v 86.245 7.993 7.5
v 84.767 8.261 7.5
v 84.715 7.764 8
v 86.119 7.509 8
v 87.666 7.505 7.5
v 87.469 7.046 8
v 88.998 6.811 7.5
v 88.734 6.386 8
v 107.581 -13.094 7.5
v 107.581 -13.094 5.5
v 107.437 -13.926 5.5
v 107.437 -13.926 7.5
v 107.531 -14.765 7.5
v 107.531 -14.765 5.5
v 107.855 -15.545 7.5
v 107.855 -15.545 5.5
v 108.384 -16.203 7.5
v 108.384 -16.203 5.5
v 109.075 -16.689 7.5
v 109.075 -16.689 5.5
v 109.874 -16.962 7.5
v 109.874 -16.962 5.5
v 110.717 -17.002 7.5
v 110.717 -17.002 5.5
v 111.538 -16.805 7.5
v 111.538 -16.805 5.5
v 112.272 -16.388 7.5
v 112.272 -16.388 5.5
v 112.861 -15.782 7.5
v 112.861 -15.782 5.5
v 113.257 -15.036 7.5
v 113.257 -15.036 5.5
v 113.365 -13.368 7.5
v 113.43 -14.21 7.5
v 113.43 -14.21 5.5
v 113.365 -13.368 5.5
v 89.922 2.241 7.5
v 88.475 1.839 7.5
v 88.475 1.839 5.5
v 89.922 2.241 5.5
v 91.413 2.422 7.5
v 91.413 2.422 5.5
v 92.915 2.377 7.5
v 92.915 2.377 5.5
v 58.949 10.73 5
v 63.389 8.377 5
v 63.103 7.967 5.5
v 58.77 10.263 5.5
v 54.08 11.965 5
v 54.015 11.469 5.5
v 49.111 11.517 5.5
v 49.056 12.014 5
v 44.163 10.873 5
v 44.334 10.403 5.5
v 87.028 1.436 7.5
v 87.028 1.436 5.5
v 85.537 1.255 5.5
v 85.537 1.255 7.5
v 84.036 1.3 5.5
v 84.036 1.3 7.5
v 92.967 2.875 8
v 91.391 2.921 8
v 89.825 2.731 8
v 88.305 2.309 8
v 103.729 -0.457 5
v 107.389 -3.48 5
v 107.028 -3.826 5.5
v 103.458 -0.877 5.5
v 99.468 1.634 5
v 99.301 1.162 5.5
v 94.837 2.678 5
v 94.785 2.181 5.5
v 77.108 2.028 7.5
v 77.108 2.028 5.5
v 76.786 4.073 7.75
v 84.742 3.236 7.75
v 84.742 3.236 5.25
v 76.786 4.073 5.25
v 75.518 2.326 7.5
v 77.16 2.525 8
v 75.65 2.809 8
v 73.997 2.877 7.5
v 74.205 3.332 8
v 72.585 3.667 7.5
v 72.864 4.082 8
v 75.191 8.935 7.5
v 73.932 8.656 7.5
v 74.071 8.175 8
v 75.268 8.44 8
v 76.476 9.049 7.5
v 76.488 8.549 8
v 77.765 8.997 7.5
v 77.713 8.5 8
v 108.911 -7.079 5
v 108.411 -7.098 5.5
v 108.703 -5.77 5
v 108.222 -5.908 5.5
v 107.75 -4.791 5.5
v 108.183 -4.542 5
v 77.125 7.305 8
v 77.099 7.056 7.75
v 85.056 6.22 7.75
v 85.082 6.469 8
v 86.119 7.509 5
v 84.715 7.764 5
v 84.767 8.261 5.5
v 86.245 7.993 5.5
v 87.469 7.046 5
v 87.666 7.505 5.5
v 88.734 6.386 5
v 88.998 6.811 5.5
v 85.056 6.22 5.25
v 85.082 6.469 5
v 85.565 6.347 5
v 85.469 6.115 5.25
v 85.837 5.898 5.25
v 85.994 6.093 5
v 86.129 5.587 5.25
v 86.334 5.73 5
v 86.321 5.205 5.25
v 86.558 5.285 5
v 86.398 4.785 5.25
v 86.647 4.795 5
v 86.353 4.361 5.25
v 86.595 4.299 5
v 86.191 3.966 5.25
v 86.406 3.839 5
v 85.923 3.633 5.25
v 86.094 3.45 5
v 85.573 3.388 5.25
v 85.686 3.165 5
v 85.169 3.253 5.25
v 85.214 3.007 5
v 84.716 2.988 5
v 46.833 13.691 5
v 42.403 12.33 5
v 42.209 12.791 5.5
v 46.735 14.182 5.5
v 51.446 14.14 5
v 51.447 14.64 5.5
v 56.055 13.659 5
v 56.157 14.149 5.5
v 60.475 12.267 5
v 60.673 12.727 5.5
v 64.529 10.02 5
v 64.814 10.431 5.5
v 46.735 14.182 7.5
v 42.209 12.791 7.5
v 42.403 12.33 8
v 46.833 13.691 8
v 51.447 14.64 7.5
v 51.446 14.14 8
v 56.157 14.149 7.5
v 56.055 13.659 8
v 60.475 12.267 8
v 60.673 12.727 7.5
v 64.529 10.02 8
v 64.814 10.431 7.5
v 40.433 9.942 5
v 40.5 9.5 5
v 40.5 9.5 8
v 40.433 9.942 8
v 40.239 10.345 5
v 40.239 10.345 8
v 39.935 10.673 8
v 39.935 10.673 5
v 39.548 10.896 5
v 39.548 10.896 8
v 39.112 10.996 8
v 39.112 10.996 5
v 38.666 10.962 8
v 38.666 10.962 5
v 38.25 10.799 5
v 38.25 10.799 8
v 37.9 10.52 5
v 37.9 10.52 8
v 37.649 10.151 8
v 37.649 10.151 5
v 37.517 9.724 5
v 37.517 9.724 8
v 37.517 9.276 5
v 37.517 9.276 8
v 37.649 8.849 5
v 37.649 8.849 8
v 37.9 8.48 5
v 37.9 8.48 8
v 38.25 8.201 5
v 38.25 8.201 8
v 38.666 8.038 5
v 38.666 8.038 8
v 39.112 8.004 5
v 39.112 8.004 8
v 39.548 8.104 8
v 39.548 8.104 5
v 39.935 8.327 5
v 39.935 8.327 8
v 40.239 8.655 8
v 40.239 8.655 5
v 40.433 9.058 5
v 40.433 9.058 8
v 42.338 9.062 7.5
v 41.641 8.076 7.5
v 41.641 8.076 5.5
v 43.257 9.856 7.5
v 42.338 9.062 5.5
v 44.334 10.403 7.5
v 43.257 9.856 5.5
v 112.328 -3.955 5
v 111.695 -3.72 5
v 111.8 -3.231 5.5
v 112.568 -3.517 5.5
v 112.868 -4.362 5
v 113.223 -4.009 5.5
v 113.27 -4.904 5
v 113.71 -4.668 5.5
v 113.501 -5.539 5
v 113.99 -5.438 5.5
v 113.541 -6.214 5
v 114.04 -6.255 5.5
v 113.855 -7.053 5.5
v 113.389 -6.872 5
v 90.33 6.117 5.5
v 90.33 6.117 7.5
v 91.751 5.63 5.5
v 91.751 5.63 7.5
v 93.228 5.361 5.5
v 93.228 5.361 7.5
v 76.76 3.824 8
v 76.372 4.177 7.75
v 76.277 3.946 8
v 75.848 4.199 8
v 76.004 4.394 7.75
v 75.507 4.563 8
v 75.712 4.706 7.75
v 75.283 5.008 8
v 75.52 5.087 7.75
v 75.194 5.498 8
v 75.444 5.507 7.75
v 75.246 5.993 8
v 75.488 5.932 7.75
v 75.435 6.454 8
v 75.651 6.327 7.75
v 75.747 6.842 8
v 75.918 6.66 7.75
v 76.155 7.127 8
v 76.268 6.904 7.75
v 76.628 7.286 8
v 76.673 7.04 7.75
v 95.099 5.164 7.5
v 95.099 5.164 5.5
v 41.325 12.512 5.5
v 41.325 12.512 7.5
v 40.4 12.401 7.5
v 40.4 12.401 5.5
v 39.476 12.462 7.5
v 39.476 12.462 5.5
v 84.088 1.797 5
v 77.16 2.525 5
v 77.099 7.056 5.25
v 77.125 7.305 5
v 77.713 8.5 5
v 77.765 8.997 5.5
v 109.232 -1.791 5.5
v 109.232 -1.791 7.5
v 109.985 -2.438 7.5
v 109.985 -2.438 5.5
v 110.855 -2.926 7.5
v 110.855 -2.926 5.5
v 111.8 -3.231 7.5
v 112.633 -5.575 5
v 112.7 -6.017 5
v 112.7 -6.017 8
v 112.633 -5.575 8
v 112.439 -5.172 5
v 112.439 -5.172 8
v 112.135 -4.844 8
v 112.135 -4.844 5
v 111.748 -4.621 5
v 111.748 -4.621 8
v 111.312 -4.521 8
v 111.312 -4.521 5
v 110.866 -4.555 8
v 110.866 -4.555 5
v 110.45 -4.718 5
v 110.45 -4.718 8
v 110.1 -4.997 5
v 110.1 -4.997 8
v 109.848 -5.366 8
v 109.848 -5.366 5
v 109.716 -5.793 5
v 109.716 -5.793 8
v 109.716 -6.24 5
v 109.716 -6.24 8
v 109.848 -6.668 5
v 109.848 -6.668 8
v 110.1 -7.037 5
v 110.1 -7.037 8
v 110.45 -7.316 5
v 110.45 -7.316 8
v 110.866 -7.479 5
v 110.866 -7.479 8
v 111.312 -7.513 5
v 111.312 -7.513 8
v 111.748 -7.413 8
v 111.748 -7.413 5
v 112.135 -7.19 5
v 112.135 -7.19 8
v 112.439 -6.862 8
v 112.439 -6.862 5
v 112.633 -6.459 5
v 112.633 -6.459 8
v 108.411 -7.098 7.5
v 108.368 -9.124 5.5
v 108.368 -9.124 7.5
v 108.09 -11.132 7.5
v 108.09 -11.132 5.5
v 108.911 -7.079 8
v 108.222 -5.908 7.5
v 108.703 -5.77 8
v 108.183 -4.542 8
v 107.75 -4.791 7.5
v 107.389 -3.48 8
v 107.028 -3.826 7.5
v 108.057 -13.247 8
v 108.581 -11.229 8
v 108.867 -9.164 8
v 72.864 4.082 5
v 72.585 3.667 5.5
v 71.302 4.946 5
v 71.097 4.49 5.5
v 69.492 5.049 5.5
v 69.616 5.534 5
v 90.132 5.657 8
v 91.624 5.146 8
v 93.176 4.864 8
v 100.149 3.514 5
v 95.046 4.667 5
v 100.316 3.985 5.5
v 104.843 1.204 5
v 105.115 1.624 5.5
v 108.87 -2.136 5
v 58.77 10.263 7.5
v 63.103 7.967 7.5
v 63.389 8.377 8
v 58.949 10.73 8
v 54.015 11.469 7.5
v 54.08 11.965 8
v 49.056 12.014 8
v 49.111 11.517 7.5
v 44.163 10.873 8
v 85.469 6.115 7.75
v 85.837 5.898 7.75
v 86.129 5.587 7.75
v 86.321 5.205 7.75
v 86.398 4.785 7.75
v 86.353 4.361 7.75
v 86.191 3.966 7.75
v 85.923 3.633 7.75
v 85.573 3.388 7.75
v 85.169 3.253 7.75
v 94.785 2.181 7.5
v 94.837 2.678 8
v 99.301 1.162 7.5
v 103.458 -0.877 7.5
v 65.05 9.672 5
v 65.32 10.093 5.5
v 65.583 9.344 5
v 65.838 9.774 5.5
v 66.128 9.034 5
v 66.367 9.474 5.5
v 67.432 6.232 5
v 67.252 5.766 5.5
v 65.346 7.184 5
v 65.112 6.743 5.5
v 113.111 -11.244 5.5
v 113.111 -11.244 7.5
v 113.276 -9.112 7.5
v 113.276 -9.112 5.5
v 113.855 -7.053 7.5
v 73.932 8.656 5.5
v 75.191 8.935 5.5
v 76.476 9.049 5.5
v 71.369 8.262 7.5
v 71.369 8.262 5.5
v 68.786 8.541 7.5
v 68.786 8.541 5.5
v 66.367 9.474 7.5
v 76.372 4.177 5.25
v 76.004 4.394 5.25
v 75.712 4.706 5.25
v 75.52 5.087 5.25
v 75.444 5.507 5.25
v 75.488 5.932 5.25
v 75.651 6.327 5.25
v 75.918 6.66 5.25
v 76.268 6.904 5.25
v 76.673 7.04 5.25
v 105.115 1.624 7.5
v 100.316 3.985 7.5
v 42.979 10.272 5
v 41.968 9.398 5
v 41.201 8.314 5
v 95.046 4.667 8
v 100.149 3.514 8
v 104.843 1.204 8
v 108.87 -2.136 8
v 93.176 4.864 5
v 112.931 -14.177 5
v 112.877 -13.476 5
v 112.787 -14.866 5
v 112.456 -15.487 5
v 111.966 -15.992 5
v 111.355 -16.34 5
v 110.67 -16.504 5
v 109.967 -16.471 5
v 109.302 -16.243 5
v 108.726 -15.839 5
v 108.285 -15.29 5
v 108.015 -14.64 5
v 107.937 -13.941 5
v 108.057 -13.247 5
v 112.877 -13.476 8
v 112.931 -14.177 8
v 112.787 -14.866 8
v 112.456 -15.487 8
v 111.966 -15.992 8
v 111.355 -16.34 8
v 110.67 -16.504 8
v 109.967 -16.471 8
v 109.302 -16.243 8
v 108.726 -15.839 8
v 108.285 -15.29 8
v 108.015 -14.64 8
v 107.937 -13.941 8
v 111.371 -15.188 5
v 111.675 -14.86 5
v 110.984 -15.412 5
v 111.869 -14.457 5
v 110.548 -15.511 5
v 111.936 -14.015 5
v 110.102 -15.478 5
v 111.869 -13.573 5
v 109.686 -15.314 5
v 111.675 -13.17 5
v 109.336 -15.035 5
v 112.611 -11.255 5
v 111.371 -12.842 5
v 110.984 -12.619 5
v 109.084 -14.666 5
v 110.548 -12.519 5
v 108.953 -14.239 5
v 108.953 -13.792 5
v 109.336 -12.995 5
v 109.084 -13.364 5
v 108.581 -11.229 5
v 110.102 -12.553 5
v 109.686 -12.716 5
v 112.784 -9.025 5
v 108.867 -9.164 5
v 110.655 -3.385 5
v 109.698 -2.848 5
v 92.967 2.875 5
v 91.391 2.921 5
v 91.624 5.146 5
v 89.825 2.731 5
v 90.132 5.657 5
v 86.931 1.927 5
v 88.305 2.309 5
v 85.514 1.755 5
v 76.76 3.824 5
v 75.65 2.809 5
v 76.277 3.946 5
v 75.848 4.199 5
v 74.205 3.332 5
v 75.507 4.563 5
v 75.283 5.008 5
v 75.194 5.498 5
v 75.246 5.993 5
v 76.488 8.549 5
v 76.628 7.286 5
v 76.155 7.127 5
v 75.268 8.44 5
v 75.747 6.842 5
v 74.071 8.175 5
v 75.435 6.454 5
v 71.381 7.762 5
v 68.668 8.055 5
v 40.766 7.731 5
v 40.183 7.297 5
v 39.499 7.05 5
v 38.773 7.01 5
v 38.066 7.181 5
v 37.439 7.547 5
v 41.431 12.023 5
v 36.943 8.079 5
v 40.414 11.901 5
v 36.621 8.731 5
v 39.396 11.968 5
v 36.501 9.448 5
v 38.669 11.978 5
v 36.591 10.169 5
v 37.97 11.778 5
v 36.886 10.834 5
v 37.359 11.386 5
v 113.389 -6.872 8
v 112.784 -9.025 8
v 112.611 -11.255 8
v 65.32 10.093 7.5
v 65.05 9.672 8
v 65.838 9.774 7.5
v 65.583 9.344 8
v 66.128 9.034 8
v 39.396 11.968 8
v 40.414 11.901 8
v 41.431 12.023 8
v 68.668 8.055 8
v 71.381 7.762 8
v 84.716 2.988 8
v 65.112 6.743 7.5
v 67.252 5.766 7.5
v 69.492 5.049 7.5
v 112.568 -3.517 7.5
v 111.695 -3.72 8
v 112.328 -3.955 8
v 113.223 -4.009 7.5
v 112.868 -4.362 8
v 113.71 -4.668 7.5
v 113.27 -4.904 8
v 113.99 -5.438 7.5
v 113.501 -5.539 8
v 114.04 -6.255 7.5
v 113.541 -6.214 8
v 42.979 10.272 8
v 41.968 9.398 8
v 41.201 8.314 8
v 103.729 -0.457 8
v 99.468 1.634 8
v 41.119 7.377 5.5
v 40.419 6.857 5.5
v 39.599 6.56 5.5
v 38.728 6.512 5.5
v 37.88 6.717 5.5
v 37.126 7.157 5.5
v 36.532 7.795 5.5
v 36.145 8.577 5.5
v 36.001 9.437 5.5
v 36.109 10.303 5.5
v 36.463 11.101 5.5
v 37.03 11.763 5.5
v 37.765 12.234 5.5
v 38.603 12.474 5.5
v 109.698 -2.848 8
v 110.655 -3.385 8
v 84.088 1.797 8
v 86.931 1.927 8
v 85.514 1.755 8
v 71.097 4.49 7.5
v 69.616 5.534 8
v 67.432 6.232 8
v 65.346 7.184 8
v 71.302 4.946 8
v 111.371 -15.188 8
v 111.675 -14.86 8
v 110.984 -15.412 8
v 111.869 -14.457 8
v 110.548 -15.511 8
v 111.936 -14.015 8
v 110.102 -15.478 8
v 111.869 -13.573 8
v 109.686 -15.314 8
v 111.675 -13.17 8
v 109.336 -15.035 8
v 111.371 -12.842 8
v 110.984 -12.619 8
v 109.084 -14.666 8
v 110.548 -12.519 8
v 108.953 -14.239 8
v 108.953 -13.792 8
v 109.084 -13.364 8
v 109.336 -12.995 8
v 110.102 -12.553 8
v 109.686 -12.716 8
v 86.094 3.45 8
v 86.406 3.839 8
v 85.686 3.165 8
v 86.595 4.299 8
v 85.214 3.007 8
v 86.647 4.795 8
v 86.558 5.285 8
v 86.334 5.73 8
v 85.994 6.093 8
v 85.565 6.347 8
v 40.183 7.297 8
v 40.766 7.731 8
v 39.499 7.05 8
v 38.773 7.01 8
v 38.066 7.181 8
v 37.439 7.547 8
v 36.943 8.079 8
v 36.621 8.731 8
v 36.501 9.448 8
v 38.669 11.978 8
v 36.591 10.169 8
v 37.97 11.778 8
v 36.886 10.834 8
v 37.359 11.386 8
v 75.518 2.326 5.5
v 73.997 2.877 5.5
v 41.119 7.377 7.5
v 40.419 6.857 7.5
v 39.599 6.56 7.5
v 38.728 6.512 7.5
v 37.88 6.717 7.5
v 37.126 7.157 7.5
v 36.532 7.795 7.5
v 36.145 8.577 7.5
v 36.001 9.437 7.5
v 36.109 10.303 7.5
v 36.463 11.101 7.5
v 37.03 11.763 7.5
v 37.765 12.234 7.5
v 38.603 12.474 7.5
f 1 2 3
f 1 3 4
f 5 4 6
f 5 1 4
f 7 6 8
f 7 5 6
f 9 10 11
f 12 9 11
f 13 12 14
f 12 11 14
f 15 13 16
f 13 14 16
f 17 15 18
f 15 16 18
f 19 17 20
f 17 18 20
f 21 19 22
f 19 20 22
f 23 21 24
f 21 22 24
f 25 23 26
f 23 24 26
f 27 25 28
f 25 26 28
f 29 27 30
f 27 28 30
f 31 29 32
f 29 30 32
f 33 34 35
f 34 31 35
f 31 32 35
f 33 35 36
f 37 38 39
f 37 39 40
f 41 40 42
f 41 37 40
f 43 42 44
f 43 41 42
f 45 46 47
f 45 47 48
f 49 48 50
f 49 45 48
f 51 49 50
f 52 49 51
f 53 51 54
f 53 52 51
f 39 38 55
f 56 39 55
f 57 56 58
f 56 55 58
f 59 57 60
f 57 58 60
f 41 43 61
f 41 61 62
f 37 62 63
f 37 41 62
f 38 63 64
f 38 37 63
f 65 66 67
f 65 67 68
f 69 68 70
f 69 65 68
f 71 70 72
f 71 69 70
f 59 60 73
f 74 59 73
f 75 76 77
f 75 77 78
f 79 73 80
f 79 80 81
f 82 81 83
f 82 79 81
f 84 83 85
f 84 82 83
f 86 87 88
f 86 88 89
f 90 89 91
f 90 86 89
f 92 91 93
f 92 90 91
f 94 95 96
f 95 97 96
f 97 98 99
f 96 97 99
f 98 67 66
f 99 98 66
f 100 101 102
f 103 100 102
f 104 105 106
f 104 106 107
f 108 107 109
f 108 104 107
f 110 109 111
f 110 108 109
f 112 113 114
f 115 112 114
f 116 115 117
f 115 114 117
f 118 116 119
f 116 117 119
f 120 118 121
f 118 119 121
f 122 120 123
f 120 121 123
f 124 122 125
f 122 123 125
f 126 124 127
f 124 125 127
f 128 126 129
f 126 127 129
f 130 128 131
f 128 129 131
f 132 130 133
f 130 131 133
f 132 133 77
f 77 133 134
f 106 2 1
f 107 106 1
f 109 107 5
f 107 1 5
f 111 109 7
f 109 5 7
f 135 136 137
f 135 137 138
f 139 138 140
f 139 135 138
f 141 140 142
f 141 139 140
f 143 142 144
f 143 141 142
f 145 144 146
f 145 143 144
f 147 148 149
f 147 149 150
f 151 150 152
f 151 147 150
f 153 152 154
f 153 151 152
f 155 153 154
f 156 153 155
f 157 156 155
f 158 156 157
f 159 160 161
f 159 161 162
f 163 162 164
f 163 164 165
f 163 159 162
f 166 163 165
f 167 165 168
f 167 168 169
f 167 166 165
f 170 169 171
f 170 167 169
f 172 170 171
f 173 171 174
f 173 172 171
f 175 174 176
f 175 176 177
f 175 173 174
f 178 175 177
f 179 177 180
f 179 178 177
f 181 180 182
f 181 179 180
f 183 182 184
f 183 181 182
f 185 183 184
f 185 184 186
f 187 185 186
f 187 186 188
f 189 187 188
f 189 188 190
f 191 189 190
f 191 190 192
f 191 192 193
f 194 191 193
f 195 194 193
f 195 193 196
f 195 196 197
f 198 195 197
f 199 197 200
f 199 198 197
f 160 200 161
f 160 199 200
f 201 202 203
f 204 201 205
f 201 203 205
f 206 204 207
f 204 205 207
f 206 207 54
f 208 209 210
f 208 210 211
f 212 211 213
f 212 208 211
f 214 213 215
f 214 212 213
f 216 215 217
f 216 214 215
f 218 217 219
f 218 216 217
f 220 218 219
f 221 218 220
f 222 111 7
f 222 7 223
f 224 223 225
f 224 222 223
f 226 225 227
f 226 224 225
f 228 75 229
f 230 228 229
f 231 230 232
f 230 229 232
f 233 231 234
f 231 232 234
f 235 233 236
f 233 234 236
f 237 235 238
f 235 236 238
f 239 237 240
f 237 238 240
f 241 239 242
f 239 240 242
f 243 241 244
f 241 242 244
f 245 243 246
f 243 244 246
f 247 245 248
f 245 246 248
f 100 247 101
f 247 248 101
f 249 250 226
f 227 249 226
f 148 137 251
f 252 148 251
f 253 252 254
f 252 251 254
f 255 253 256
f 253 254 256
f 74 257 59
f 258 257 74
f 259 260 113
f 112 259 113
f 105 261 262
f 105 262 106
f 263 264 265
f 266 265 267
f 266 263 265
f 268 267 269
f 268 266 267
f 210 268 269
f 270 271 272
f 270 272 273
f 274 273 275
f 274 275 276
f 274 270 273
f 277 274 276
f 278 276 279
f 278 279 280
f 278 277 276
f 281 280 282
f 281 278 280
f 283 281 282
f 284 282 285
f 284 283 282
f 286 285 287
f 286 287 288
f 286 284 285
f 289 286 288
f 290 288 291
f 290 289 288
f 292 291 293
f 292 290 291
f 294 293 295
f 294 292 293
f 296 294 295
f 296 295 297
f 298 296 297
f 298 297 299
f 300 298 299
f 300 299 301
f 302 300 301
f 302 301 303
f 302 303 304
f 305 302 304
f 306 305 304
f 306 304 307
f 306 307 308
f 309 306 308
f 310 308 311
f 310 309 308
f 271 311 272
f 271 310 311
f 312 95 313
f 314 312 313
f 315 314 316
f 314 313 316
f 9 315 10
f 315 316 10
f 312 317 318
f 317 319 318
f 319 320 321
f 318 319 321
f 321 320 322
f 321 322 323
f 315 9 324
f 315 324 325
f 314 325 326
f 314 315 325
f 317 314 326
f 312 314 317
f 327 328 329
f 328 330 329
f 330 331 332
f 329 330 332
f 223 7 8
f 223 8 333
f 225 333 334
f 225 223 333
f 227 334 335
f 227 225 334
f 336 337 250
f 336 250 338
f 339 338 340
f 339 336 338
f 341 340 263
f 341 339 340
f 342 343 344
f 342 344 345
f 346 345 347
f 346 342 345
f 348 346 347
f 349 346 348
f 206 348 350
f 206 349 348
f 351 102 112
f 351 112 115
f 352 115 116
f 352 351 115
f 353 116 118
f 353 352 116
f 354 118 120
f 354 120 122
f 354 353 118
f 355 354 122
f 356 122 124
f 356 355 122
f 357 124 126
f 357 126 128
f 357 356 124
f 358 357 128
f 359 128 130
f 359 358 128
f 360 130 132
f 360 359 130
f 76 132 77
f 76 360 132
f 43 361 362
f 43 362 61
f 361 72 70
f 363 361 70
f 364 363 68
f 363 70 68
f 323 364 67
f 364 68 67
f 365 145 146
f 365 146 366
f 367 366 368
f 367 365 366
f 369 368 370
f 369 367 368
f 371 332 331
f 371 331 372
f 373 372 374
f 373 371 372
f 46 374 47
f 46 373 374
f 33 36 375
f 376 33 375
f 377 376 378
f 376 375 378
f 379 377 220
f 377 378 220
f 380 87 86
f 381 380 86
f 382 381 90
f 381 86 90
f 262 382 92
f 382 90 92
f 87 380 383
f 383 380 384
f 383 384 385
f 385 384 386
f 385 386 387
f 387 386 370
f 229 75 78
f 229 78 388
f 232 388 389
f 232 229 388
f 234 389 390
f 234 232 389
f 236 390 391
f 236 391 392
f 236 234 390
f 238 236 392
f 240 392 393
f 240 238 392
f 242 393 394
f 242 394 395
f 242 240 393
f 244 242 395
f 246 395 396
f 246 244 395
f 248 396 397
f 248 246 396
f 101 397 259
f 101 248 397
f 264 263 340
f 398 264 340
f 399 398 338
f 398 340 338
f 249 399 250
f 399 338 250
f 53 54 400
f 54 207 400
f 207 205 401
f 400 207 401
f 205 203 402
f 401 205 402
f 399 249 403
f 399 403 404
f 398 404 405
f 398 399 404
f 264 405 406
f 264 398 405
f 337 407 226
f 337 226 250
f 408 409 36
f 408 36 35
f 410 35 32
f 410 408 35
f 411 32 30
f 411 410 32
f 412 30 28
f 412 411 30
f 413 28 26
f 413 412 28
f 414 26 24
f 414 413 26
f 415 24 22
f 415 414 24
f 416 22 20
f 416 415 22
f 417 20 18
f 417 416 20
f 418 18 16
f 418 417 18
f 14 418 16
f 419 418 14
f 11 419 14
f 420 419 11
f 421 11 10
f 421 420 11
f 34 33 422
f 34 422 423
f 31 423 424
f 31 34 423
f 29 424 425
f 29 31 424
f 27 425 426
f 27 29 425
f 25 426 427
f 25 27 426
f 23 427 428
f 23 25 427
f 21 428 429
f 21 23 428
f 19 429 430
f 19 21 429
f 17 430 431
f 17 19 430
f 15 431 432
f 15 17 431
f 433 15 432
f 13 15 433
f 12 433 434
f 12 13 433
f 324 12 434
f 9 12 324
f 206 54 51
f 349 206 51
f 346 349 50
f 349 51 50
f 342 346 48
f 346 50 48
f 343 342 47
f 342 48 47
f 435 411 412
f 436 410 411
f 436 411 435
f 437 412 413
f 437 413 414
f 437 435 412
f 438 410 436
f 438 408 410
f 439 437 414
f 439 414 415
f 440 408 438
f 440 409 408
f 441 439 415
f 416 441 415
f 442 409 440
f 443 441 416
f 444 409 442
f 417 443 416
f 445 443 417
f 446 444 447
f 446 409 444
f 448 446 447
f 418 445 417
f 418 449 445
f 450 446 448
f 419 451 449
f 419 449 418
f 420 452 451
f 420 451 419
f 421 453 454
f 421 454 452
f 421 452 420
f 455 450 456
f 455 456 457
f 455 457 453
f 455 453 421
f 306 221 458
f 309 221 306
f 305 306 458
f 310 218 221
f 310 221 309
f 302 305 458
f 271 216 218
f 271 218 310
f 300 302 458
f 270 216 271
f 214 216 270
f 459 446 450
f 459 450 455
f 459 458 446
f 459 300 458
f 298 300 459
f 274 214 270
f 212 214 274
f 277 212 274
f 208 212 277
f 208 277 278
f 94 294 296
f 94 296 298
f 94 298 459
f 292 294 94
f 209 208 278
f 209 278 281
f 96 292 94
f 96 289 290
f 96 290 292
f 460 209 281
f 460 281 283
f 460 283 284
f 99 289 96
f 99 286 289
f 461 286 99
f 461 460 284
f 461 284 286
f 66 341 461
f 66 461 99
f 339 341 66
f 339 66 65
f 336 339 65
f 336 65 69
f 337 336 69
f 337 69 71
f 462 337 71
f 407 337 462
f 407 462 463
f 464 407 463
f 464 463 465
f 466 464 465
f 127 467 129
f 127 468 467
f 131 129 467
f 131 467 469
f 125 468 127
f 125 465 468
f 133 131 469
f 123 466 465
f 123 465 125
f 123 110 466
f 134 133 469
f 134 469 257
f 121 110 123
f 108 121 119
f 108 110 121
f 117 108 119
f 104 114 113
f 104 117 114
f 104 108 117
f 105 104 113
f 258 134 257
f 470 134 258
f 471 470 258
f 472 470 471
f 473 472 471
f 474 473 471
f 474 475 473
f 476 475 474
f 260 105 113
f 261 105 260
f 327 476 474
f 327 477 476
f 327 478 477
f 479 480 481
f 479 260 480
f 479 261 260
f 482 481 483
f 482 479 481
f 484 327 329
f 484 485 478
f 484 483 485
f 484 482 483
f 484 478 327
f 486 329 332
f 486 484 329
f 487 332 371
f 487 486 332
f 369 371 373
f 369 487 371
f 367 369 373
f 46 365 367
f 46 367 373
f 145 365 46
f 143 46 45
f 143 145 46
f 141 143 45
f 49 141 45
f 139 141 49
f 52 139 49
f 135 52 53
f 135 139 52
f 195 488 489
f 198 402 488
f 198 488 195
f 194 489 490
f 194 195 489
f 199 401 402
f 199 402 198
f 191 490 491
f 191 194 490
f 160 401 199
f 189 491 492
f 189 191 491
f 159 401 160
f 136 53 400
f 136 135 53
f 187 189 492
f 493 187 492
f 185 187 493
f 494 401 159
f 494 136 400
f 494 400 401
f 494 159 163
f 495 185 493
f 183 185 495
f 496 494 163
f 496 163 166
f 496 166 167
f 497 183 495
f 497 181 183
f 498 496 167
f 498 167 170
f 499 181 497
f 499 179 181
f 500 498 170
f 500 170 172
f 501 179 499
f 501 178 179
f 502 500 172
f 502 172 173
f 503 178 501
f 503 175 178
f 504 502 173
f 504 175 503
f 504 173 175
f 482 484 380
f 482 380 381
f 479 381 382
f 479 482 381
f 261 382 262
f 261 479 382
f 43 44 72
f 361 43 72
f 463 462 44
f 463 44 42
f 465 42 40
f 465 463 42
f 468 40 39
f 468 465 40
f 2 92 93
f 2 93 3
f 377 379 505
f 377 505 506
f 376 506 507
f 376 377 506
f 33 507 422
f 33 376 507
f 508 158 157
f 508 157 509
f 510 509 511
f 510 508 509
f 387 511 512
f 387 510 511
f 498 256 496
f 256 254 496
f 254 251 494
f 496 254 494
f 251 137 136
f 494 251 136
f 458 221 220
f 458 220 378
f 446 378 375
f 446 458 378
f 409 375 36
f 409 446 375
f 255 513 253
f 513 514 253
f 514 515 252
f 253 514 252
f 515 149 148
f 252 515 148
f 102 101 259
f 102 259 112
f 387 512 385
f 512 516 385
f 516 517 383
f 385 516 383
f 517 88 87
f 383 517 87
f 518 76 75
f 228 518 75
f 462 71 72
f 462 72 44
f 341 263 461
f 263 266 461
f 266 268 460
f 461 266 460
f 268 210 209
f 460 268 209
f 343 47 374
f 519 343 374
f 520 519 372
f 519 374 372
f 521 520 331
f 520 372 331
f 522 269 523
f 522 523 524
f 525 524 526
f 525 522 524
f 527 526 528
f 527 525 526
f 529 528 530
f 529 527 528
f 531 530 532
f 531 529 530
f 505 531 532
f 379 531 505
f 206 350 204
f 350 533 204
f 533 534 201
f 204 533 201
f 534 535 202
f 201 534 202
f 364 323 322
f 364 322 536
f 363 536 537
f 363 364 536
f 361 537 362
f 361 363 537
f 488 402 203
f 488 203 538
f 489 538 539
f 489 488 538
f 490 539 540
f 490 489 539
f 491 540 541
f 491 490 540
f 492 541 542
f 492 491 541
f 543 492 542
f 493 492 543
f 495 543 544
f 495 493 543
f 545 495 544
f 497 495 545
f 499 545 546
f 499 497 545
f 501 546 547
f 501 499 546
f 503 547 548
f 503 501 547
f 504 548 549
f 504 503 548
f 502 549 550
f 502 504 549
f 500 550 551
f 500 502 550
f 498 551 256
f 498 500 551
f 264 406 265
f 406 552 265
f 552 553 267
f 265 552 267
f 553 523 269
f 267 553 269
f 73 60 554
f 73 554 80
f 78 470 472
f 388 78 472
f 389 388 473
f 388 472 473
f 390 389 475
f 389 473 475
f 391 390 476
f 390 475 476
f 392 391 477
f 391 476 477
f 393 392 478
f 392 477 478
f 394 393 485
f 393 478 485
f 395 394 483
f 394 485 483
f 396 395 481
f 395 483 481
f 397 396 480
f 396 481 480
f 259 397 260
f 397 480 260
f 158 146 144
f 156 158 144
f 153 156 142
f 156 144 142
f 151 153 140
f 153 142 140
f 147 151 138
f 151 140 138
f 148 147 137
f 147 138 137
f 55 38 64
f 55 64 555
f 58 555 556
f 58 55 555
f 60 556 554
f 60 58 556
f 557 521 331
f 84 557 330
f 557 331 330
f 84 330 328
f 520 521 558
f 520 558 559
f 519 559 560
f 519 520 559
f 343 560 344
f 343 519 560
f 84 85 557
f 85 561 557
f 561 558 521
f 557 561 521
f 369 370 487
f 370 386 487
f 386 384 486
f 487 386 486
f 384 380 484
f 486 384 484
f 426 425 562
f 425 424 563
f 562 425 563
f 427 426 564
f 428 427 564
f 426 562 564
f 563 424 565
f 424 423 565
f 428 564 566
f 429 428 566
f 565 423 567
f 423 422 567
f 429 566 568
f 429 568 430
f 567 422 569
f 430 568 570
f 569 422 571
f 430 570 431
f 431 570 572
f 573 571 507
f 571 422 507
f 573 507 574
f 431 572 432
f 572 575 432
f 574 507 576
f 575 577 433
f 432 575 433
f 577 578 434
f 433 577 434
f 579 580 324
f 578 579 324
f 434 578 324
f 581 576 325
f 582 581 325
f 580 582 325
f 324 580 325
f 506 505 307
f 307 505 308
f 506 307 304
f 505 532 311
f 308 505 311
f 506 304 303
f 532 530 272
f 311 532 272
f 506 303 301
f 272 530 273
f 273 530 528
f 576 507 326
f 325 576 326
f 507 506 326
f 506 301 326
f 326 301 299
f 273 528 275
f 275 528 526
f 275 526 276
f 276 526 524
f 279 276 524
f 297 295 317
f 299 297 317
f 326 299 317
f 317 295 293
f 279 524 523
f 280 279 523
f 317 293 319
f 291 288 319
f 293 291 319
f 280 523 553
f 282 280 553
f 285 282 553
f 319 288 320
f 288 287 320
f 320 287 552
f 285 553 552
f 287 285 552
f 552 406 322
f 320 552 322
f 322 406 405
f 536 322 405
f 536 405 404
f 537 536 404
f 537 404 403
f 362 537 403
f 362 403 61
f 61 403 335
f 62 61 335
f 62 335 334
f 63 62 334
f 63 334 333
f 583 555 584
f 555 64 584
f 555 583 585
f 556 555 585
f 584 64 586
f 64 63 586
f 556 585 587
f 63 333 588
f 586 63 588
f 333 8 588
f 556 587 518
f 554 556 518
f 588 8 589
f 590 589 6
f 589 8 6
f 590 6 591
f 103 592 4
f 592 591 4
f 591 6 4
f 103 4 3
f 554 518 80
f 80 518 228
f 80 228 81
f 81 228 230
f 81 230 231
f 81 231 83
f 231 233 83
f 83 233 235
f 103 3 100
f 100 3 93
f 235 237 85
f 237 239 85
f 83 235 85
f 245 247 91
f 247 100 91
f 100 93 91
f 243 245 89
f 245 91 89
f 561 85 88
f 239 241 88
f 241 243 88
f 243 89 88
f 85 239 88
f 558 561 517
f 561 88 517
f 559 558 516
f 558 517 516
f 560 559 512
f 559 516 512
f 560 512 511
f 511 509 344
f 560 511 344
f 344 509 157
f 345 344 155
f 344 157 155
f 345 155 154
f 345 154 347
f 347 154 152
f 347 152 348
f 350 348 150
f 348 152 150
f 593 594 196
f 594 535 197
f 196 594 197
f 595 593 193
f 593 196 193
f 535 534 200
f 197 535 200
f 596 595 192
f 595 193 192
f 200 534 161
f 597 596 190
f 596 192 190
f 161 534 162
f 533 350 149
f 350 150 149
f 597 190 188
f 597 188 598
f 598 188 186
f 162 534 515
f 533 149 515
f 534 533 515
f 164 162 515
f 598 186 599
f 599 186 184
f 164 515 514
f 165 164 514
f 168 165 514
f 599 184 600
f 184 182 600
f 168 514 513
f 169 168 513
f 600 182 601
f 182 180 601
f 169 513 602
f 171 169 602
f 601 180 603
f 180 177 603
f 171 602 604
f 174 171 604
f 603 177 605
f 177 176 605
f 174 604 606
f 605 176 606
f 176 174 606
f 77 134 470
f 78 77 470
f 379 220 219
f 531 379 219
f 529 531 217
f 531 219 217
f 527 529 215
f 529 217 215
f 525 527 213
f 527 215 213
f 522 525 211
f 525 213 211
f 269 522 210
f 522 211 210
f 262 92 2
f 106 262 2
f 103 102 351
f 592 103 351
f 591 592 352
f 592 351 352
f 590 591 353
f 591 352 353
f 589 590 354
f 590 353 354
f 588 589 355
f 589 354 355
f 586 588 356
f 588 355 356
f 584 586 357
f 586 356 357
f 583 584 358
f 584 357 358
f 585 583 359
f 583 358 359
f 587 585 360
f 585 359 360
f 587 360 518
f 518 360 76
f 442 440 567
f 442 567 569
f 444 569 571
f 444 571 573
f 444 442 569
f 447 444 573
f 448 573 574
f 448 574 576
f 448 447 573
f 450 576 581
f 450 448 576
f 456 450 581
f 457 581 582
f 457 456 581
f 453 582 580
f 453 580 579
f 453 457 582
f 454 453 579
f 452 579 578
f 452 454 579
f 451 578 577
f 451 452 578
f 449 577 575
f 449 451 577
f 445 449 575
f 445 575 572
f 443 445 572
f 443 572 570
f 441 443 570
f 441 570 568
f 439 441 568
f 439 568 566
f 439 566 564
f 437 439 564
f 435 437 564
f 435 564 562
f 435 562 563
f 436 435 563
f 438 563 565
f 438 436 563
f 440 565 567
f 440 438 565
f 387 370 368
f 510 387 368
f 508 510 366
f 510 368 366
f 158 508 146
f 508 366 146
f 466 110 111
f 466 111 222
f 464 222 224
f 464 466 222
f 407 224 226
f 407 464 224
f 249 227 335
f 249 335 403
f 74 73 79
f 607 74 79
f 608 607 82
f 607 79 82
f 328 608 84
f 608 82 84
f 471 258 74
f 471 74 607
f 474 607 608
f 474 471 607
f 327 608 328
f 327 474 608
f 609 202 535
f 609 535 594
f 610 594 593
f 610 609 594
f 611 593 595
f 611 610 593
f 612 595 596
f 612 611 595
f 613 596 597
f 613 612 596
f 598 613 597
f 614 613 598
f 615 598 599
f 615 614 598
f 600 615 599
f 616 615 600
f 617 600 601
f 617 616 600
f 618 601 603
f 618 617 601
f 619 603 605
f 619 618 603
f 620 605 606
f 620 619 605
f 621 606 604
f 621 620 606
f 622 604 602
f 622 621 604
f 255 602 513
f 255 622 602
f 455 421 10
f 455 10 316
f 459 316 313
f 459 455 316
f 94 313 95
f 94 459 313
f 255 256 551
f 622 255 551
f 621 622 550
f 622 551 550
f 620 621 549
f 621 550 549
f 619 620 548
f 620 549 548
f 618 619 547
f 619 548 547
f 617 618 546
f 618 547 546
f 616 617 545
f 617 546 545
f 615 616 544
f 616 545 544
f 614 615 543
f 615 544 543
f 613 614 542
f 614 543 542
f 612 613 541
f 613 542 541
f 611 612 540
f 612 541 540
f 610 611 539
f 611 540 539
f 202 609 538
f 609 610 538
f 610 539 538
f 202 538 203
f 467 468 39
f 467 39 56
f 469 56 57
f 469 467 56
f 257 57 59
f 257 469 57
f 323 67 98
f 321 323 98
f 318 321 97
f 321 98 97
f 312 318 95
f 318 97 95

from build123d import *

# Parameters (mm, degrees)
SKETCH1_R             = 1.5
BOSS_EXTRUDE1_DEPTH   = 3
SKETCH1_R_2           = 3
BOSS_EXTRUDE1_2_DEPTH = 3
EXTRUDE_THIN1_DEPTH   = 3
BOSS_EXTRUDE2_DEPTH   = 3
FILLET1_R             = 10
FILLET2_R             = 10
FILLET3_R             = 5
CUT_EXTRUDE2_DEPTH    = 3
CHAMFER1_SIZE         = 0.25
FILLET4_SIZE          = 0.5


with BuildPart() as part:
    # Sketch1 → Boss-Extrude1 (new body)
    with BuildSketch(Plane.XY.offset(5)):
        with BuildLine():
            ThreePointArc((109.185458354, -4.000646729), (108.5228767, -5.038603319), (108.360025672, -6.259196566))
            ThreePointArc((108.360025672, -6.259196566), (108.310958913, -9.715379327), (107.5808738, -13.093926729))
            ThreePointArc((107.5808738, -13.093926729), (110.294106049, -17.011846795), (113.365194477, -13.367653777))
            ThreePointArc((113.365194477, -13.367653777), (113.140936636, -10.174222756), (113.854520762, -7.053471091))
            ThreePointArc((113.854520762, -7.053471091), (112.759359915, -3.631536319), (109.185458354, -4.000646729))
        make_face()
        with Locations((111.199707869, -6.016905367)):
            Circle(SKETCH1_R, mode=Mode.SUBTRACT)
        with Locations((110.435914095, -14.015200256)):
            Circle(SKETCH1_R, mode=Mode.SUBTRACT)
    extrude(amount=BOSS_EXTRUDE1_DEPTH)



with BuildPart() as body_2:
    # Sketch1 → Boss-Extrude1 2 (new body)
    with BuildSketch(Plane.XY.offset(5)):
        with Locations((39, 9.5)):
            Circle(SKETCH1_R_2)
        with Locations((39, 9.5)):
            Circle(SKETCH1_R, mode=Mode.SUBTRACT)
    extrude(amount=BOSS_EXTRUDE1_2_DEPTH)


with BuildPart() as part_1:
    add(part.part)

    add(body_2.part)  # Extrude-Thin1 merges body 2
    # Sketch3 → Extrude-Thin1 (add)
    with BuildSketch(Plane.XY.offset(5)):
        with BuildLine():
            ThreePointArc((41.593001143, 9.173549984), (52.518716901, 11.608273697), (63.103455441, 7.966508408))
            ThreePointArc((63.103455441, 7.966508408), (67.496674945, 5.672669193), (72.321939964, 4.541787477))
            Line((72.321939964, 4.541787477), (94.785034536, 2.180821101))
            ThreePointArc((94.785034536, 2.180821101), (102.503244611, -0.298409767), (108.581874595, -5.661954302))
            Line((108.581874595, -5.661954302), (110.985068552, -3.8662208))
            ThreePointArc((110.985068552, -3.8662208), (103.98579607, 2.309662542), (95.098619926, 5.164386787))
            Line((95.098619926, 5.164386787), (72.635525354, 7.525353163))
            ThreePointArc((72.635525354, 7.525353163), (68.541425508, 8.484874068), (64.813903968, 10.431131266))
            ThreePointArc((64.813903968, 10.431131266), (52.686795037, 14.60356162), (40.169022902, 11.814058641))
            Line((40.169022902, 11.814058641), (41.593001143, 9.173549984))
        make_face()
    extrude(amount=EXTRUDE_THIN1_DEPTH)

    # Sketch4 → Boss-Extrude2 (add)
    with BuildSketch(Plane.XY.offset(8)):
        Polygon((71.8385125, 9.620139149), (90.734428512, 7.634098347), (90.002729269, 0.672445079), (71.106813257, 2.658485881), align=None)
        with BuildLine():
            Line((77.099325998, 7.05618881), (85.055501161, 6.219961104))
            ThreePointArc((85.055501161, 6.219961104), (86.390491309, 4.571385566), (84.741915771, 3.236395418))
            Line((84.741915771, 3.236395418), (76.785740608, 4.072623124))
            ThreePointArc((76.785740608, 4.072623124), (75.45075046, 5.721198662), (77.099325998, 7.05618881))
        make_face(mode=Mode.SUBTRACT)
    extrude(amount=-BOSS_EXTRUDE2_DEPTH)

    # Fillet1
    # the kernel refuses this fillet: 10 mm, written as the material it takes off along each edge
    with BuildSketch(Plane(origin=(90.002729269, 0.672445079, 23), x_dir=(0.10452846326752661, 0.9945218953682867, 0), z_dir=(0, 0, -1))) as fillet1_piece_1:
        with BuildLine():
            CenterArc((10, -6), FILLET1_R, 143.130102354, 36.869897646)
            Line((0, -6), (-0.2, -6))
            Line((-0.2, -6), (-0.2, 0))
            Line((-0.2, 0), (0, 0.2))
            ThreePointArc((0, 0.2), (1, 0.2), (1.84, 0.12))
            Line((1.84, 0.12), (2, 0))
        make_face()
    extrude(amount=33, mode=Mode.SUBTRACT)
    with BuildSketch(Plane(origin=(90.734428512, 7.634098347, 23), x_dir=(-0.10452846326775972, -0.9945218953682622, 0), z_dir=(0, 0, -1))) as fillet1_piece_2:
        with BuildLine():
            CenterArc((10, 6), FILLET1_R, 180, 36.869897646)
            Line((0, 6), (-0.2, 6))
            Line((-0.2, 6), (-0.2, 0))
            Line((-0.2, 0), (0, -0.2))
            ThreePointArc((0, -0.2), (1, -0.2), (1.84, -0.12))
            Line((1.84, -0.12), (2, 0))
        make_face()
    extrude(amount=33, mode=Mode.SUBTRACT)
    with BuildSketch(Plane(origin=(71.106813257, 2.658485881, 23.085820281), x_dir=(0.9945218953682746, -0.10452846326764255, 0), z_dir=(0, 0, -1))) as fillet1_piece_3:
        with BuildLine():
            CenterArc((6.034328112, -10), FILLET1_R, 90, 37.116152296)
            Line((0, -2.025861537), (-0.120686562, -1.866378767))
            ThreePointArc((-0.120686562, -1.866378767), (-0.2, -1.012930768), (-0.2, 0))
            Line((-0.2, 0), (0, 0.2))
            Line((0, 0.2), (6.034328112, 0.2))
            Line((6.034328112, 0.2), (6.034328112, 0))
        make_face()
    extrude(amount=33.171640562, mode=Mode.SUBTRACT)
    with BuildSketch(Plane(origin=(71.8385125, 9.620139149, 22.897832051), x_dir=(-0.10452846326748966, -0.9945218953682906, 0), z_dir=(0, 0, -1))) as fillet1_piece_4:
        with BuildLine():
            CenterArc((10, -5.95913282), FILLET1_R, 143.422234679, 36.577765321)
            Line((0, -5.95913282), (-0.2, -5.95913282))
            Line((-0.2, -5.95913282), (-0.2, 0))
            Line((-0.2, 0), (0, 0.2))
            ThreePointArc((0, 0.2), (0.984756046, 0.2), (1.808902334, 0.119182656))
            Line((1.808902334, 0.119182656), (1.969512093, 0))
        make_face()
    extrude(amount=32.795664101, mode=Mode.SUBTRACT)

    # Fillet2
    fillet2_edges = [part_1.edges().sort_by_distance(p)[0] for p in [
        (71.632642427, 7.66141625, 6.5),
        (90.525371585, 5.645054556, 6.5),
        (90.211786196, 2.66148887, 6.5),
        (71.31857345, 4.673249537, 6.5),
    ]]
    fillet(fillet2_edges, radius=FILLET2_R)

    # Fillet3
    fillet3_edges = [part_1.edges().sort_by_distance(p)[0] for p in [
        (108.409742984, -5.435015389, 6.5),
        (110.509408047, -3.251767729, 6.5),
        (41.997837089, 9.386101864, 6.5),
        (40.597330828, 12.039396429, 6.5),
    ]]
    fillet(fillet3_edges, radius=FILLET3_R)

    # Sketch4<2> → Cut-Extrude2 (cut)
    with BuildSketch(Plane.XY.offset(8)):
        with BuildLine():
            Line((77.099325998, 7.05618881), (85.055501161, 6.219961104))
            ThreePointArc((85.055501161, 6.219961104), (86.390491309, 4.571385566), (84.741915771, 3.236395418))
            Line((84.741915771, 3.236395418), (76.785740608, 4.072623124))
            ThreePointArc((76.785740608, 4.072623124), (75.45075046, 5.721198662), (77.099325998, 7.05618881))
        make_face()
    extrude(amount=-CUT_EXTRUDE2_DEPTH, mode=Mode.SUBTRACT)

    # Chamfer1
    chamfer1_edges = [part_1.edges().sort_by_distance(p)[0] for p in [
        (81.077413579, 6.638074957, 8),
        (86.390491309, 4.571385566, 5),
        (80.76382819, 3.654509271, 5),
        (75.45075046, 5.721198662, 5),
        (81.077413579, 6.638074957, 5),
        (75.45075046, 5.721198662, 8),
        (80.76382819, 3.654509271, 8),
        (86.390491309, 4.571385566, 8),
    ]]
    chamfer(chamfer1_edges, length=CHAMFER1_SIZE)

    # Fillet4
    fillet4_edges = [part_1.edges().sort_by_distance(p)[0] for p in [
        (80.571841293, 1.663671348, 5),
        (80.571841293, 1.663671348, 8),
        (81.266148853, 8.62925464, 8),
        (75.831843077, 9.0125273, 8),
        (86.285883658, 1.317701678, 8),
        (81.266148853, 8.62925464, 5),
        (74.746621894, 2.571133627, 5),
        (86.964648505, 7.775717809, 5),
        (74.746621894, 2.571133627, 8),
        (66.167237141, 6.222318503, 8),
        (66.167237141, 6.222318503, 5),
        (65.577546873, 9.931341027, 8),
        (65.577546873, 9.931341027, 5),
        (75.831843077, 9.0125273, 5),
        (86.285883658, 1.317701678, 5),
        (53.814375327, 14.513121306, 5),
        (86.964648505, 7.775717809, 8),
        (71.097481671, 4.489860289, 5),
        (54.015350868, 11.469337492, 8),
        (71.097481671, 4.489860289, 8),
        (70.068678069, 8.317079629, 5),
        (70.068678069, 8.317079629, 8),
        (90.66440994, 2.359315815, 8),
        (90.66440994, 2.359315815, 5),
        (91.030929726, 5.846518637, 8),
        (91.030929726, 5.846518637, 5),
        (93.849865119, 2.279111367, 8),
        (101.439573781, 0.26418945, 5),
        (101.439573781, 0.26418945, 8),
        (108.258346947, -10.132192641, 5),
        (108.258346947, -10.132192641, 8),
        (102.785056404, 2.945662756, 5),
        (102.785056404, 2.945662756, 8),
        (36.30994009, 8.172002379, 5),
        (36.30994009, 8.172002379, 8),
        (94.163450509, 5.262677053, 5),
        (108.019819848, -5.334888598, 8),
        (108.019819848, -5.334888598, 5),
        (110.407911183, -2.704163701, 8),
        (110.407911183, -2.704163701, 5),
        (42.773374787, 9.487301339, 8),
        (42.773374787, 9.487301339, 5),
        (40.865302991, 12.434666794, 8),
        (94.163450509, 5.262677053, 8),
        (40.865302991, 12.434666794, 5),
        (53.814375327, 14.513121306, 8),
        (54.015350868, 11.469337492, 5),
        (93.849865119, 2.279111367, 5),
        (113.710131038, -4.667729504, 5),
        (110.294106049, -17.011846795, 8),
        (113.710131038, -4.667729504, 8),
        (113.140936636, -10.174222756, 5),
        (110.294106049, -17.011846795, 5),
        (113.140936636, -10.174222756, 8),
    ]]
    chamfer(fillet4_edges, length=FILLET4_SIZE)


solid = part_1.part
